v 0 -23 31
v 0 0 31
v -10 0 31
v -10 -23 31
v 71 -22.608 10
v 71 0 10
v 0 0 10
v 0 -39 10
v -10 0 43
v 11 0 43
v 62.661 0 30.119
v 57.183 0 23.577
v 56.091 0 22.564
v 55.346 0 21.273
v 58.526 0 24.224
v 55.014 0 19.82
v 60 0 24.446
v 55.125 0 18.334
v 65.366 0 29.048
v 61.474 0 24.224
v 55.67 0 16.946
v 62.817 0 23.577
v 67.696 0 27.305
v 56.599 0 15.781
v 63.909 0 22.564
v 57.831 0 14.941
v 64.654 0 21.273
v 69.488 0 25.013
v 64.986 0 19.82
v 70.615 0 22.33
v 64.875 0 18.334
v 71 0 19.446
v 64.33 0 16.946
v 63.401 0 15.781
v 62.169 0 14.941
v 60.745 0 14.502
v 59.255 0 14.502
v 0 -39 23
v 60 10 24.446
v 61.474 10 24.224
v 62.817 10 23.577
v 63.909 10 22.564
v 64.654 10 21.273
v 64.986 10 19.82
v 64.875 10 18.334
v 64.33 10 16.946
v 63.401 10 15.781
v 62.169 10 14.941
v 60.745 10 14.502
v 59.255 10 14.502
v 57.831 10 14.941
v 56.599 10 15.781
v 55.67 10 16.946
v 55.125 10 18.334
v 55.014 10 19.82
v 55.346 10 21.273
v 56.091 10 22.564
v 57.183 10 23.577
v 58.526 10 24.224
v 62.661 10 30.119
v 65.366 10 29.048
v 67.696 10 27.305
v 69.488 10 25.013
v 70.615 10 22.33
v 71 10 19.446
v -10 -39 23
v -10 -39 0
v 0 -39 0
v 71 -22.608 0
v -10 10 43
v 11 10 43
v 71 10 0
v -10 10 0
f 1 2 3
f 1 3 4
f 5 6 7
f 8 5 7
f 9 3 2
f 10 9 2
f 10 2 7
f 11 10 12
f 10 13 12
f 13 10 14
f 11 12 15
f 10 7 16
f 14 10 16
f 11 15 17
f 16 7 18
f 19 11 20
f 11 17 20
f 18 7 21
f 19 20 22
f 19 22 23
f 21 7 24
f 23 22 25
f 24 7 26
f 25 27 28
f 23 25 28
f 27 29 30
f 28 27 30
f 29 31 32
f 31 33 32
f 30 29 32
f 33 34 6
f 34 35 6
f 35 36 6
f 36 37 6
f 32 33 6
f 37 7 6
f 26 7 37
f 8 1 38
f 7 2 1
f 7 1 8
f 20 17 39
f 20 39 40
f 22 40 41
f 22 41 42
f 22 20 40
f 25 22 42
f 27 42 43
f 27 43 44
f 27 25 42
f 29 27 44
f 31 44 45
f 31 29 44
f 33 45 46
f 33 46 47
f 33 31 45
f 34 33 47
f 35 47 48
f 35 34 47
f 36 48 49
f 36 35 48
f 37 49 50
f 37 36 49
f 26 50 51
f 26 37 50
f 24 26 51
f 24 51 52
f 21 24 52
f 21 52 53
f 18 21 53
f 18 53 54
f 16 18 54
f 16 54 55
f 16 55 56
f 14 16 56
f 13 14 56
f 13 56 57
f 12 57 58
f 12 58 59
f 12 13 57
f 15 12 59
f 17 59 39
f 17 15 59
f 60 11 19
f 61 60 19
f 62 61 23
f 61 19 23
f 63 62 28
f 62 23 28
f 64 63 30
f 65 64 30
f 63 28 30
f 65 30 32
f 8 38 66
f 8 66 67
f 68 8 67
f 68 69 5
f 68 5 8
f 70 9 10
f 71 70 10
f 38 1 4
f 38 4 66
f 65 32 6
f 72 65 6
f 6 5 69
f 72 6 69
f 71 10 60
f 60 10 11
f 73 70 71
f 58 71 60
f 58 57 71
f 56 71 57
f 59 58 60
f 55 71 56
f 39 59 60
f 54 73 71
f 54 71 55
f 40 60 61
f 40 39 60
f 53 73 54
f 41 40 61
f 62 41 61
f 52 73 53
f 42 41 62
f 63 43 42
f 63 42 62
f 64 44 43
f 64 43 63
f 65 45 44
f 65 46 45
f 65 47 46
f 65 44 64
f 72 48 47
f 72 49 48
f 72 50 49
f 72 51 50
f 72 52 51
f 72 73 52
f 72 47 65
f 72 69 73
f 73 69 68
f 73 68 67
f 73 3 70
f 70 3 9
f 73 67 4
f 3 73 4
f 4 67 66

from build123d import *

# Parameters (mm, degrees)
BOSS_EXTRUDE1_DEPTH = 10
BOSS_EXTRUDE2_DEPTH = 10
SKETCH6_R           = 11
SKETCH6_R_2         = 5
BOSS_EXTRUDE3_DEPTH = 10


with BuildPart() as part:
    # Sketch1 → Boss-Extrude1 (new body)
    with BuildSketch(Plane.XY):
        Polygon((0, 0), (71, 0), (71, -22.60835843), (0, -39), align=None)
    extrude(amount=BOSS_EXTRUDE1_DEPTH)

    # Sketch3 → Boss-Extrude2 (add)
    with BuildSketch(Plane.ZY):
        Polygon((0, 0), (31, 0), (31, -23), (23, -39), (0, -39), align=None)
    extrude(amount=BOSS_EXTRUDE2_DEPTH)

    # Sketch6 → Boss-Extrude3 (add)
    # profile 1 of 2: a face of its own
    with BuildSketch(Plane(origin=(0, 0, 0), x_dir=(1, 0, 0), z_dir=(0, 1, 0))):
        with Locations((60, -19.446177938)):
            Circle(SKETCH6_R)
        with Locations(Location((60, -19.446177938, 0), (0, 0, 270))):
            Circle(SKETCH6_R_2, mode=Mode.SUBTRACT)
    # profile 2 of 2: a face of its own
    with BuildSketch(Plane(origin=(0, 0, 0), x_dir=(1, 0, 0), z_dir=(0, 1, 0))):
        with BuildLine():
            Line((71, -19.446177938), (71, 0))
            Line((71, 0), (-10, 0))
            Line((-10, 0), (-10, -43))
            Line((-10, -43), (11, -43))
            Line((11, -43), (62.661140852, -30.119430927))
            ThreePointArc((62.661140852, -30.119430927), (51.33188171, -12.673901709), (71, -19.446177938))
        make_face()
    extrude(amount=BOSS_EXTRUDE3_DEPTH)


solid = part.part
